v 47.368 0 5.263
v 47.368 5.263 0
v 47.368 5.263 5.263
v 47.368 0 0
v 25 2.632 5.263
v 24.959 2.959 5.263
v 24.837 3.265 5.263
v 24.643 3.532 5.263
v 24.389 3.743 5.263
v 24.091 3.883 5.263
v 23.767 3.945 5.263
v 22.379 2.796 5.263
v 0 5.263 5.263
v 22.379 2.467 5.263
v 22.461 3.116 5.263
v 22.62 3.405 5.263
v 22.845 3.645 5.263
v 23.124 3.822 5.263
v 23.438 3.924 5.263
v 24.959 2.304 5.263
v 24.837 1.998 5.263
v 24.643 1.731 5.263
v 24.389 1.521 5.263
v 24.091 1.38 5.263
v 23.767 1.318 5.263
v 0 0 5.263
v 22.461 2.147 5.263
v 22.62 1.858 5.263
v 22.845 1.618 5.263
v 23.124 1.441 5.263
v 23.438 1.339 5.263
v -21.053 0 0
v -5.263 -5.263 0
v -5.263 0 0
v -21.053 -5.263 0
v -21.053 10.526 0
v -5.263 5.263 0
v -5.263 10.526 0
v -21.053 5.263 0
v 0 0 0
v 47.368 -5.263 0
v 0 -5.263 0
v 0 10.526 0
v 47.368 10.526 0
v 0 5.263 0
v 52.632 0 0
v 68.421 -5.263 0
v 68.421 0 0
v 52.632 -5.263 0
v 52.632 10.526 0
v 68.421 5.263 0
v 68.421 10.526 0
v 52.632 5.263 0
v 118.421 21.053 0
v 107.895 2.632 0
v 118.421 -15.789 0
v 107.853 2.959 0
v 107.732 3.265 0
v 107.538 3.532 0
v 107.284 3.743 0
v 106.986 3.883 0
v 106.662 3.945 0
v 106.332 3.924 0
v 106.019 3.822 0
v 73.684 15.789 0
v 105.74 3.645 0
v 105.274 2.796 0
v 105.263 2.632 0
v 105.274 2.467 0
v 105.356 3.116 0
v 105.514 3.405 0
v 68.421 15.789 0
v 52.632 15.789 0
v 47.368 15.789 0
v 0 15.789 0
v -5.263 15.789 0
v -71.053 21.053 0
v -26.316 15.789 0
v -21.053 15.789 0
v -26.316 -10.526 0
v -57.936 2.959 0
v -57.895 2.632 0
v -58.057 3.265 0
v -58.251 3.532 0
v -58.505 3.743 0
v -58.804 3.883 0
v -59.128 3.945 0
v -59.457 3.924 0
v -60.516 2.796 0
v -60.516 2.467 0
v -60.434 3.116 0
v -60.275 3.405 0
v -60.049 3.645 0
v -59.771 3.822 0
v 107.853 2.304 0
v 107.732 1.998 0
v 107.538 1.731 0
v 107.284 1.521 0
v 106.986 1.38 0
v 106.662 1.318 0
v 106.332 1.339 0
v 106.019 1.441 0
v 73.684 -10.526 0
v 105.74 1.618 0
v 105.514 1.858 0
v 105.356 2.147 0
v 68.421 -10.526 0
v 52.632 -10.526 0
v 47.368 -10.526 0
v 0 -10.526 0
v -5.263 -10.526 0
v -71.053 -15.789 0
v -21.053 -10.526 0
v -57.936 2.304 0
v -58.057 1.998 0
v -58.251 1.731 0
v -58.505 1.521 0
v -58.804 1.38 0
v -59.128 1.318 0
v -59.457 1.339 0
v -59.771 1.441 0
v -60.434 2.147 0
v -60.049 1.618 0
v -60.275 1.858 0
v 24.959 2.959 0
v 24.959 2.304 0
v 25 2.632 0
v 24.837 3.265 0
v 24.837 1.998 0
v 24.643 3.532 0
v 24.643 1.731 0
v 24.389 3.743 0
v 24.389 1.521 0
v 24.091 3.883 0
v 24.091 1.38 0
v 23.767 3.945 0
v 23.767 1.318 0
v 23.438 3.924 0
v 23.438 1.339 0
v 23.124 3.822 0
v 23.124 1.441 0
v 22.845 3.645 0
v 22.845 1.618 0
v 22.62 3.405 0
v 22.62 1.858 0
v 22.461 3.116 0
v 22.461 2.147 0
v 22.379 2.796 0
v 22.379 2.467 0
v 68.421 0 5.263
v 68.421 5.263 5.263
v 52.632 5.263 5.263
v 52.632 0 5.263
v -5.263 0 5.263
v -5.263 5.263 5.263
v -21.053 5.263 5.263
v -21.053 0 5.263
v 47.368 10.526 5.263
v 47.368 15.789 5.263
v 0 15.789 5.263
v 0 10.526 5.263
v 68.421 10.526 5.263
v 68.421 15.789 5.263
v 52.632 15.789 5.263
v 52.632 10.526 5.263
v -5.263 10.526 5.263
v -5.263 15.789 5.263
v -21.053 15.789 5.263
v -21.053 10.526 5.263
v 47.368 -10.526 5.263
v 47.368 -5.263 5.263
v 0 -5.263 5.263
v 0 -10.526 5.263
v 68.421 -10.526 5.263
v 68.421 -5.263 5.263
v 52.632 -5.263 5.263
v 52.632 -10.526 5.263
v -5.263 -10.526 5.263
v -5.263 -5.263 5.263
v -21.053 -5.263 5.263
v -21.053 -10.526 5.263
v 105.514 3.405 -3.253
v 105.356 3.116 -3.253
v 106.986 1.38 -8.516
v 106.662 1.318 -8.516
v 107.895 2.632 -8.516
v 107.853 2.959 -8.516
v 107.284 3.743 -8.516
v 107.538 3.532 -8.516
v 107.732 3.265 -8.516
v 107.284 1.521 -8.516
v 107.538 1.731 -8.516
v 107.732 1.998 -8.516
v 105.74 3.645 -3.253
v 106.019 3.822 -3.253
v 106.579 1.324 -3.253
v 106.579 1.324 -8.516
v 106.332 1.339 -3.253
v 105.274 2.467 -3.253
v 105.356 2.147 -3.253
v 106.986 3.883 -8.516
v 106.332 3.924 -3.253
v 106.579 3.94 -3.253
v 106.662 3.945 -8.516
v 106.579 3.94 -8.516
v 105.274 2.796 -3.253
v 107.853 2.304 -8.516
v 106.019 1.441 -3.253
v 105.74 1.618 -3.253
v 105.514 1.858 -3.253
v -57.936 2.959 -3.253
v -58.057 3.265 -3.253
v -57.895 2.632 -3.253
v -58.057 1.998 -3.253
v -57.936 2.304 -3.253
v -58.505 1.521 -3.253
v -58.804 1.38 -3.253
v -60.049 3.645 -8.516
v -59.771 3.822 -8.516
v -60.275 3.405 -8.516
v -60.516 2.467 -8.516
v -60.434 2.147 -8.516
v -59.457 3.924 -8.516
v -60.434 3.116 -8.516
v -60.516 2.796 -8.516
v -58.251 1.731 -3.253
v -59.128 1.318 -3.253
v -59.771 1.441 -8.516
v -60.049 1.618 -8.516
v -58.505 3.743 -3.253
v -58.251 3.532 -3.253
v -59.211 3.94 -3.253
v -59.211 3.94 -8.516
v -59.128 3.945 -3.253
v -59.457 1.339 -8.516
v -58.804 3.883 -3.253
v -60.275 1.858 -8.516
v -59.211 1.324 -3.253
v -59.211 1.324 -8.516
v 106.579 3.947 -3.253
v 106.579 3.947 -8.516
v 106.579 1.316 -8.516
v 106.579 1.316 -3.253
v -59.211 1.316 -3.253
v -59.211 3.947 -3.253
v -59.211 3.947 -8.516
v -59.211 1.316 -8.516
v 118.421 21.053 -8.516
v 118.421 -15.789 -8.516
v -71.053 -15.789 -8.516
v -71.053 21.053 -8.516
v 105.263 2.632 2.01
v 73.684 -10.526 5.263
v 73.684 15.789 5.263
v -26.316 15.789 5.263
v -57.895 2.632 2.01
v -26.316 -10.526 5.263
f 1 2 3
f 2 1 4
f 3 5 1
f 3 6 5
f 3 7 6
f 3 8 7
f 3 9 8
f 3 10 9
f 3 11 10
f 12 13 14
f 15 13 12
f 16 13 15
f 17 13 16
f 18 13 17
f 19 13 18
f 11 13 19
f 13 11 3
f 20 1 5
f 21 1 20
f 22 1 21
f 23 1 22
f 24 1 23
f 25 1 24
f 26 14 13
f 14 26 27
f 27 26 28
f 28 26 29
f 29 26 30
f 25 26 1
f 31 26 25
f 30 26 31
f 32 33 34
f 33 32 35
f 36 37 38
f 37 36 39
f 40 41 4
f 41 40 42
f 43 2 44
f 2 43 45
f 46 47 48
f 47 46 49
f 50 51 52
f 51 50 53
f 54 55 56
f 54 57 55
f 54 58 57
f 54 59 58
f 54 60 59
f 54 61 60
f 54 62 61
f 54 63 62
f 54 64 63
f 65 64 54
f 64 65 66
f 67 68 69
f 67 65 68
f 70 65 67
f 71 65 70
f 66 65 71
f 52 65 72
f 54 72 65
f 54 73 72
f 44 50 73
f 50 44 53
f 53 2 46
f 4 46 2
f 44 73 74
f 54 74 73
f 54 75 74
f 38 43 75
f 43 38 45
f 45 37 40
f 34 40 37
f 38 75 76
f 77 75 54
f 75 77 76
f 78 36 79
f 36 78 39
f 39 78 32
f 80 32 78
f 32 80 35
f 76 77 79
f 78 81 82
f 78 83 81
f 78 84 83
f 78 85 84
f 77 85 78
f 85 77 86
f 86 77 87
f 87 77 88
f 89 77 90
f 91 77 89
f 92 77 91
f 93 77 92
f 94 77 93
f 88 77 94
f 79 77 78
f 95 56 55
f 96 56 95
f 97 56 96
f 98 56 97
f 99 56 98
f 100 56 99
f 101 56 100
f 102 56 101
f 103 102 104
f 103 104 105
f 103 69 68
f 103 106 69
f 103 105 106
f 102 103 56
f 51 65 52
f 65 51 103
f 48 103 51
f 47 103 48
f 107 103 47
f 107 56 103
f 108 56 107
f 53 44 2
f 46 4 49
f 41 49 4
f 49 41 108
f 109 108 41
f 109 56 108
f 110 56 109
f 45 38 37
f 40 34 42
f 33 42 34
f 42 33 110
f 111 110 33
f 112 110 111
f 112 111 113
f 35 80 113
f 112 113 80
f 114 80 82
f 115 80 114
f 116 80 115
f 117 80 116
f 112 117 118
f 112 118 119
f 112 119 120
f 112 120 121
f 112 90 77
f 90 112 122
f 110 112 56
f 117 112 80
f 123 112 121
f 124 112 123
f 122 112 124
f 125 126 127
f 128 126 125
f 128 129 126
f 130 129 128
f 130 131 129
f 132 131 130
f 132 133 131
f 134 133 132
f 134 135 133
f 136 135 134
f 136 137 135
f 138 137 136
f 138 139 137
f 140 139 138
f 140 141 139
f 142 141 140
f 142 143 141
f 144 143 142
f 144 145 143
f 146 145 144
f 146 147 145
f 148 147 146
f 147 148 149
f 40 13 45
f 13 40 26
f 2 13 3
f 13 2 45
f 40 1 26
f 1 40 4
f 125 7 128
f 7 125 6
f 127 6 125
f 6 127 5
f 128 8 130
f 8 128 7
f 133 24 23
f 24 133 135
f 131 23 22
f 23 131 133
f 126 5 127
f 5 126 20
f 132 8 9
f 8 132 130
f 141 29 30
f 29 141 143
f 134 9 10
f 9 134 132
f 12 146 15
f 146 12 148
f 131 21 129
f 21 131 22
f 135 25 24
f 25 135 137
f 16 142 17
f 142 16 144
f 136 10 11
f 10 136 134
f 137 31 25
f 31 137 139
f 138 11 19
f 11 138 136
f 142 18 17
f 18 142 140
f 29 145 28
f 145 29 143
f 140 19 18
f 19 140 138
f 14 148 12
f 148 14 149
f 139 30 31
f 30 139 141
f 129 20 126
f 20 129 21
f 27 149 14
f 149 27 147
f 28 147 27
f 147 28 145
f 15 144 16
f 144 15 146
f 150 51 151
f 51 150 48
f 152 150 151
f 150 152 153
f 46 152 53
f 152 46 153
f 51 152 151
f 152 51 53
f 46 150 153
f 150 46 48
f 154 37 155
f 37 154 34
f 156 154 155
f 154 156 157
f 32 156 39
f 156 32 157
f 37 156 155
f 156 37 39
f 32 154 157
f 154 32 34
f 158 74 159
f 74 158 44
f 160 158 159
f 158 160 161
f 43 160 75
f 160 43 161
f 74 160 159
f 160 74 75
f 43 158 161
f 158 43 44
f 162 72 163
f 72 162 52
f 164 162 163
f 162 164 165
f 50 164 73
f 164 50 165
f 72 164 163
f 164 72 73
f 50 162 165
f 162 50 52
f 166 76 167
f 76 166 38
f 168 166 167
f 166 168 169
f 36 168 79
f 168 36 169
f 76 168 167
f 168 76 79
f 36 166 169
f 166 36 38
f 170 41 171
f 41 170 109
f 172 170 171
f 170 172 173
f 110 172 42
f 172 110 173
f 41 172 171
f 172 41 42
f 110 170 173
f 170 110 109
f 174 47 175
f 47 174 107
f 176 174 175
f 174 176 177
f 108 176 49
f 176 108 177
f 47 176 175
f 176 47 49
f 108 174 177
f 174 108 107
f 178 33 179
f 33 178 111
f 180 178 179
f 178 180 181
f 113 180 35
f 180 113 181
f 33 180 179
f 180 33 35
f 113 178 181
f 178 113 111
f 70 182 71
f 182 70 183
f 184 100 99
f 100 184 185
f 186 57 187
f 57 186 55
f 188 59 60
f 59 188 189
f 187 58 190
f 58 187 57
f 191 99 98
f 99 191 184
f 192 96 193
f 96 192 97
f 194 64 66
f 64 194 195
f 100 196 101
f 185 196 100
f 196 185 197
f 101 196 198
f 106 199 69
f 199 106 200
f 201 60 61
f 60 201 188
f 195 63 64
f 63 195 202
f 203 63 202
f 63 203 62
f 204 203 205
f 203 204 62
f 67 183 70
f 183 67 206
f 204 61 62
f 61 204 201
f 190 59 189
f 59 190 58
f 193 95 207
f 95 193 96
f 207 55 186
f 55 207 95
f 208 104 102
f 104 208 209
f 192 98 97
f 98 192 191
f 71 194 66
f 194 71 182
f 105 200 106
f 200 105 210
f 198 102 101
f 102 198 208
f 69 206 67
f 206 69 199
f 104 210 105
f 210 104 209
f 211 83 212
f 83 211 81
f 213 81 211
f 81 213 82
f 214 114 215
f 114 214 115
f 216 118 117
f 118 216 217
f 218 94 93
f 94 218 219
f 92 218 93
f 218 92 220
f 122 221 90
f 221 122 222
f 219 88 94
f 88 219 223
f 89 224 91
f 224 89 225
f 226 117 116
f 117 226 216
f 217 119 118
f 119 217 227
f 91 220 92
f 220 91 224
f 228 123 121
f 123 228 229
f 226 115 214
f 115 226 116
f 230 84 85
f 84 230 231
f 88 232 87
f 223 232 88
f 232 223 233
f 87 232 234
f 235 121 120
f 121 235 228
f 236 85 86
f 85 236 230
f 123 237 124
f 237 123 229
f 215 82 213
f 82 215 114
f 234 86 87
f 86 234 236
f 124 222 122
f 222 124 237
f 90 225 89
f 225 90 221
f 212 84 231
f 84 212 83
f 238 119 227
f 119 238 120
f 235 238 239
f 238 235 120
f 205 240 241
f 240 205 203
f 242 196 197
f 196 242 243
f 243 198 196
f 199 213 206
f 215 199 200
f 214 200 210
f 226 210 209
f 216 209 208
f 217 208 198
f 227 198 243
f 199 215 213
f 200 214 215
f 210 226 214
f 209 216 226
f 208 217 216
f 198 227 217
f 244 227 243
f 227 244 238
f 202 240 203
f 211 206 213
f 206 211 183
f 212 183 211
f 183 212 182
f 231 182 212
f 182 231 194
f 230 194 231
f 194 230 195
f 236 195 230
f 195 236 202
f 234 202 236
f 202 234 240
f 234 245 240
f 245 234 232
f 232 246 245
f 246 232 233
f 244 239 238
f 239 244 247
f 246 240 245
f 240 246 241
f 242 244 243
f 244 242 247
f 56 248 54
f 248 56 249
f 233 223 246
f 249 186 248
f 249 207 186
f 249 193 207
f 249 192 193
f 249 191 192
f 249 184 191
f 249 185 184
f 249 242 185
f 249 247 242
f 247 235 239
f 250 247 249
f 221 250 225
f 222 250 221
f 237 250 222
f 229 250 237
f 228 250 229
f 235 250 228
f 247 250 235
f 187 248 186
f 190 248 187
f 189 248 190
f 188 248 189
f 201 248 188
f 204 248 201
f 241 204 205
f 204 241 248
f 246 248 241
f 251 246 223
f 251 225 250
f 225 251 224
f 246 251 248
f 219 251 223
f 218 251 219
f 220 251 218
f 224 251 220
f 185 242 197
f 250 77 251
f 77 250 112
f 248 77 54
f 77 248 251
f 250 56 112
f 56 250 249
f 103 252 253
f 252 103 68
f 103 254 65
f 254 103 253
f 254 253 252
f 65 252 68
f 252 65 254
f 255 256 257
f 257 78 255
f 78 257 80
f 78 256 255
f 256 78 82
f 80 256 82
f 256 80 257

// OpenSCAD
module atlantean (wd, taper=false, hole=false) {
    unit = wd/19;
    
    bar(unit,hole);
    translate([0, 2*unit, 0])
    bar(unit);
    translate([0, -2*unit, 0])
    bar(unit);
    translate([14*unit, -(4*unit)/2, 0])
    triangle(unit, taper);
    translate([-5*unit, 3*unit, 0])
    rotate(a=180 )
    triangle(unit, taper);
    difference() {
        base(unit);
        cutout(unit);
    }
    
}

module bar(unit, mid=false) {
    if(mid) {
        difference() {
            cube([9*unit, unit, unit]);
            translate([(9*unit)/2,unit/2, -0.5])
            cylinder(h=unit+1, d=unit/2, $fn=25);
        }
    } else {
        cube([9*unit, unit, unit]);
    }
    translate([unit+(9*unit), 0, 0])
    cube([3*unit, unit, unit]);
    translate([-unit- 3*unit, 0, 0])
    cube([3*unit, unit, unit]);
}

function triPts(unit) = [[0,0], [0,5*unit], [6*unit, (5*unit)/2]];

function taperTriPts(unit) = concat(triPts(unit), [[0,0,unit], [0,5*unit, unit], [6*unit, (5*unit)/2, unit-(unit/golden())]]);
function golden() = (1+sqrt(5))/2;


module triangle(unit, fade=false) {
    if (fade) {
        polyhedron(points=taperTriPts(unit), faces=[[0,2,1], [3,4,5], [0,3,5,2],[1,2,5,4], [0,1,4,3]]);
    } else {
        linear_extrude(unit)
        polygon(points=triPts(unit));
    }
    
}

module base(unit) {
    translate([-13.5*unit, -3*unit, -golden()*unit])
    cube([36*unit, 7*unit, golden()*unit]);
    
}

module cutout(unit) {
    translate([20*unit+unit/4, unit/2, -2.5*unit])
    cylinder(h=5*unit, d=unit/2, $fn=25);
    translate([-11*unit-unit/4, unit/2, -2.5*unit])
    cylinder(h=5*unit, d=unit/2, $fn=25);
    translate([-11.25*unit, unit/4, -golden()*unit-1])
    cube([31.5*unit, unit/2, unit+1]);
}

atlantean(100, hole=true, taper=true);
